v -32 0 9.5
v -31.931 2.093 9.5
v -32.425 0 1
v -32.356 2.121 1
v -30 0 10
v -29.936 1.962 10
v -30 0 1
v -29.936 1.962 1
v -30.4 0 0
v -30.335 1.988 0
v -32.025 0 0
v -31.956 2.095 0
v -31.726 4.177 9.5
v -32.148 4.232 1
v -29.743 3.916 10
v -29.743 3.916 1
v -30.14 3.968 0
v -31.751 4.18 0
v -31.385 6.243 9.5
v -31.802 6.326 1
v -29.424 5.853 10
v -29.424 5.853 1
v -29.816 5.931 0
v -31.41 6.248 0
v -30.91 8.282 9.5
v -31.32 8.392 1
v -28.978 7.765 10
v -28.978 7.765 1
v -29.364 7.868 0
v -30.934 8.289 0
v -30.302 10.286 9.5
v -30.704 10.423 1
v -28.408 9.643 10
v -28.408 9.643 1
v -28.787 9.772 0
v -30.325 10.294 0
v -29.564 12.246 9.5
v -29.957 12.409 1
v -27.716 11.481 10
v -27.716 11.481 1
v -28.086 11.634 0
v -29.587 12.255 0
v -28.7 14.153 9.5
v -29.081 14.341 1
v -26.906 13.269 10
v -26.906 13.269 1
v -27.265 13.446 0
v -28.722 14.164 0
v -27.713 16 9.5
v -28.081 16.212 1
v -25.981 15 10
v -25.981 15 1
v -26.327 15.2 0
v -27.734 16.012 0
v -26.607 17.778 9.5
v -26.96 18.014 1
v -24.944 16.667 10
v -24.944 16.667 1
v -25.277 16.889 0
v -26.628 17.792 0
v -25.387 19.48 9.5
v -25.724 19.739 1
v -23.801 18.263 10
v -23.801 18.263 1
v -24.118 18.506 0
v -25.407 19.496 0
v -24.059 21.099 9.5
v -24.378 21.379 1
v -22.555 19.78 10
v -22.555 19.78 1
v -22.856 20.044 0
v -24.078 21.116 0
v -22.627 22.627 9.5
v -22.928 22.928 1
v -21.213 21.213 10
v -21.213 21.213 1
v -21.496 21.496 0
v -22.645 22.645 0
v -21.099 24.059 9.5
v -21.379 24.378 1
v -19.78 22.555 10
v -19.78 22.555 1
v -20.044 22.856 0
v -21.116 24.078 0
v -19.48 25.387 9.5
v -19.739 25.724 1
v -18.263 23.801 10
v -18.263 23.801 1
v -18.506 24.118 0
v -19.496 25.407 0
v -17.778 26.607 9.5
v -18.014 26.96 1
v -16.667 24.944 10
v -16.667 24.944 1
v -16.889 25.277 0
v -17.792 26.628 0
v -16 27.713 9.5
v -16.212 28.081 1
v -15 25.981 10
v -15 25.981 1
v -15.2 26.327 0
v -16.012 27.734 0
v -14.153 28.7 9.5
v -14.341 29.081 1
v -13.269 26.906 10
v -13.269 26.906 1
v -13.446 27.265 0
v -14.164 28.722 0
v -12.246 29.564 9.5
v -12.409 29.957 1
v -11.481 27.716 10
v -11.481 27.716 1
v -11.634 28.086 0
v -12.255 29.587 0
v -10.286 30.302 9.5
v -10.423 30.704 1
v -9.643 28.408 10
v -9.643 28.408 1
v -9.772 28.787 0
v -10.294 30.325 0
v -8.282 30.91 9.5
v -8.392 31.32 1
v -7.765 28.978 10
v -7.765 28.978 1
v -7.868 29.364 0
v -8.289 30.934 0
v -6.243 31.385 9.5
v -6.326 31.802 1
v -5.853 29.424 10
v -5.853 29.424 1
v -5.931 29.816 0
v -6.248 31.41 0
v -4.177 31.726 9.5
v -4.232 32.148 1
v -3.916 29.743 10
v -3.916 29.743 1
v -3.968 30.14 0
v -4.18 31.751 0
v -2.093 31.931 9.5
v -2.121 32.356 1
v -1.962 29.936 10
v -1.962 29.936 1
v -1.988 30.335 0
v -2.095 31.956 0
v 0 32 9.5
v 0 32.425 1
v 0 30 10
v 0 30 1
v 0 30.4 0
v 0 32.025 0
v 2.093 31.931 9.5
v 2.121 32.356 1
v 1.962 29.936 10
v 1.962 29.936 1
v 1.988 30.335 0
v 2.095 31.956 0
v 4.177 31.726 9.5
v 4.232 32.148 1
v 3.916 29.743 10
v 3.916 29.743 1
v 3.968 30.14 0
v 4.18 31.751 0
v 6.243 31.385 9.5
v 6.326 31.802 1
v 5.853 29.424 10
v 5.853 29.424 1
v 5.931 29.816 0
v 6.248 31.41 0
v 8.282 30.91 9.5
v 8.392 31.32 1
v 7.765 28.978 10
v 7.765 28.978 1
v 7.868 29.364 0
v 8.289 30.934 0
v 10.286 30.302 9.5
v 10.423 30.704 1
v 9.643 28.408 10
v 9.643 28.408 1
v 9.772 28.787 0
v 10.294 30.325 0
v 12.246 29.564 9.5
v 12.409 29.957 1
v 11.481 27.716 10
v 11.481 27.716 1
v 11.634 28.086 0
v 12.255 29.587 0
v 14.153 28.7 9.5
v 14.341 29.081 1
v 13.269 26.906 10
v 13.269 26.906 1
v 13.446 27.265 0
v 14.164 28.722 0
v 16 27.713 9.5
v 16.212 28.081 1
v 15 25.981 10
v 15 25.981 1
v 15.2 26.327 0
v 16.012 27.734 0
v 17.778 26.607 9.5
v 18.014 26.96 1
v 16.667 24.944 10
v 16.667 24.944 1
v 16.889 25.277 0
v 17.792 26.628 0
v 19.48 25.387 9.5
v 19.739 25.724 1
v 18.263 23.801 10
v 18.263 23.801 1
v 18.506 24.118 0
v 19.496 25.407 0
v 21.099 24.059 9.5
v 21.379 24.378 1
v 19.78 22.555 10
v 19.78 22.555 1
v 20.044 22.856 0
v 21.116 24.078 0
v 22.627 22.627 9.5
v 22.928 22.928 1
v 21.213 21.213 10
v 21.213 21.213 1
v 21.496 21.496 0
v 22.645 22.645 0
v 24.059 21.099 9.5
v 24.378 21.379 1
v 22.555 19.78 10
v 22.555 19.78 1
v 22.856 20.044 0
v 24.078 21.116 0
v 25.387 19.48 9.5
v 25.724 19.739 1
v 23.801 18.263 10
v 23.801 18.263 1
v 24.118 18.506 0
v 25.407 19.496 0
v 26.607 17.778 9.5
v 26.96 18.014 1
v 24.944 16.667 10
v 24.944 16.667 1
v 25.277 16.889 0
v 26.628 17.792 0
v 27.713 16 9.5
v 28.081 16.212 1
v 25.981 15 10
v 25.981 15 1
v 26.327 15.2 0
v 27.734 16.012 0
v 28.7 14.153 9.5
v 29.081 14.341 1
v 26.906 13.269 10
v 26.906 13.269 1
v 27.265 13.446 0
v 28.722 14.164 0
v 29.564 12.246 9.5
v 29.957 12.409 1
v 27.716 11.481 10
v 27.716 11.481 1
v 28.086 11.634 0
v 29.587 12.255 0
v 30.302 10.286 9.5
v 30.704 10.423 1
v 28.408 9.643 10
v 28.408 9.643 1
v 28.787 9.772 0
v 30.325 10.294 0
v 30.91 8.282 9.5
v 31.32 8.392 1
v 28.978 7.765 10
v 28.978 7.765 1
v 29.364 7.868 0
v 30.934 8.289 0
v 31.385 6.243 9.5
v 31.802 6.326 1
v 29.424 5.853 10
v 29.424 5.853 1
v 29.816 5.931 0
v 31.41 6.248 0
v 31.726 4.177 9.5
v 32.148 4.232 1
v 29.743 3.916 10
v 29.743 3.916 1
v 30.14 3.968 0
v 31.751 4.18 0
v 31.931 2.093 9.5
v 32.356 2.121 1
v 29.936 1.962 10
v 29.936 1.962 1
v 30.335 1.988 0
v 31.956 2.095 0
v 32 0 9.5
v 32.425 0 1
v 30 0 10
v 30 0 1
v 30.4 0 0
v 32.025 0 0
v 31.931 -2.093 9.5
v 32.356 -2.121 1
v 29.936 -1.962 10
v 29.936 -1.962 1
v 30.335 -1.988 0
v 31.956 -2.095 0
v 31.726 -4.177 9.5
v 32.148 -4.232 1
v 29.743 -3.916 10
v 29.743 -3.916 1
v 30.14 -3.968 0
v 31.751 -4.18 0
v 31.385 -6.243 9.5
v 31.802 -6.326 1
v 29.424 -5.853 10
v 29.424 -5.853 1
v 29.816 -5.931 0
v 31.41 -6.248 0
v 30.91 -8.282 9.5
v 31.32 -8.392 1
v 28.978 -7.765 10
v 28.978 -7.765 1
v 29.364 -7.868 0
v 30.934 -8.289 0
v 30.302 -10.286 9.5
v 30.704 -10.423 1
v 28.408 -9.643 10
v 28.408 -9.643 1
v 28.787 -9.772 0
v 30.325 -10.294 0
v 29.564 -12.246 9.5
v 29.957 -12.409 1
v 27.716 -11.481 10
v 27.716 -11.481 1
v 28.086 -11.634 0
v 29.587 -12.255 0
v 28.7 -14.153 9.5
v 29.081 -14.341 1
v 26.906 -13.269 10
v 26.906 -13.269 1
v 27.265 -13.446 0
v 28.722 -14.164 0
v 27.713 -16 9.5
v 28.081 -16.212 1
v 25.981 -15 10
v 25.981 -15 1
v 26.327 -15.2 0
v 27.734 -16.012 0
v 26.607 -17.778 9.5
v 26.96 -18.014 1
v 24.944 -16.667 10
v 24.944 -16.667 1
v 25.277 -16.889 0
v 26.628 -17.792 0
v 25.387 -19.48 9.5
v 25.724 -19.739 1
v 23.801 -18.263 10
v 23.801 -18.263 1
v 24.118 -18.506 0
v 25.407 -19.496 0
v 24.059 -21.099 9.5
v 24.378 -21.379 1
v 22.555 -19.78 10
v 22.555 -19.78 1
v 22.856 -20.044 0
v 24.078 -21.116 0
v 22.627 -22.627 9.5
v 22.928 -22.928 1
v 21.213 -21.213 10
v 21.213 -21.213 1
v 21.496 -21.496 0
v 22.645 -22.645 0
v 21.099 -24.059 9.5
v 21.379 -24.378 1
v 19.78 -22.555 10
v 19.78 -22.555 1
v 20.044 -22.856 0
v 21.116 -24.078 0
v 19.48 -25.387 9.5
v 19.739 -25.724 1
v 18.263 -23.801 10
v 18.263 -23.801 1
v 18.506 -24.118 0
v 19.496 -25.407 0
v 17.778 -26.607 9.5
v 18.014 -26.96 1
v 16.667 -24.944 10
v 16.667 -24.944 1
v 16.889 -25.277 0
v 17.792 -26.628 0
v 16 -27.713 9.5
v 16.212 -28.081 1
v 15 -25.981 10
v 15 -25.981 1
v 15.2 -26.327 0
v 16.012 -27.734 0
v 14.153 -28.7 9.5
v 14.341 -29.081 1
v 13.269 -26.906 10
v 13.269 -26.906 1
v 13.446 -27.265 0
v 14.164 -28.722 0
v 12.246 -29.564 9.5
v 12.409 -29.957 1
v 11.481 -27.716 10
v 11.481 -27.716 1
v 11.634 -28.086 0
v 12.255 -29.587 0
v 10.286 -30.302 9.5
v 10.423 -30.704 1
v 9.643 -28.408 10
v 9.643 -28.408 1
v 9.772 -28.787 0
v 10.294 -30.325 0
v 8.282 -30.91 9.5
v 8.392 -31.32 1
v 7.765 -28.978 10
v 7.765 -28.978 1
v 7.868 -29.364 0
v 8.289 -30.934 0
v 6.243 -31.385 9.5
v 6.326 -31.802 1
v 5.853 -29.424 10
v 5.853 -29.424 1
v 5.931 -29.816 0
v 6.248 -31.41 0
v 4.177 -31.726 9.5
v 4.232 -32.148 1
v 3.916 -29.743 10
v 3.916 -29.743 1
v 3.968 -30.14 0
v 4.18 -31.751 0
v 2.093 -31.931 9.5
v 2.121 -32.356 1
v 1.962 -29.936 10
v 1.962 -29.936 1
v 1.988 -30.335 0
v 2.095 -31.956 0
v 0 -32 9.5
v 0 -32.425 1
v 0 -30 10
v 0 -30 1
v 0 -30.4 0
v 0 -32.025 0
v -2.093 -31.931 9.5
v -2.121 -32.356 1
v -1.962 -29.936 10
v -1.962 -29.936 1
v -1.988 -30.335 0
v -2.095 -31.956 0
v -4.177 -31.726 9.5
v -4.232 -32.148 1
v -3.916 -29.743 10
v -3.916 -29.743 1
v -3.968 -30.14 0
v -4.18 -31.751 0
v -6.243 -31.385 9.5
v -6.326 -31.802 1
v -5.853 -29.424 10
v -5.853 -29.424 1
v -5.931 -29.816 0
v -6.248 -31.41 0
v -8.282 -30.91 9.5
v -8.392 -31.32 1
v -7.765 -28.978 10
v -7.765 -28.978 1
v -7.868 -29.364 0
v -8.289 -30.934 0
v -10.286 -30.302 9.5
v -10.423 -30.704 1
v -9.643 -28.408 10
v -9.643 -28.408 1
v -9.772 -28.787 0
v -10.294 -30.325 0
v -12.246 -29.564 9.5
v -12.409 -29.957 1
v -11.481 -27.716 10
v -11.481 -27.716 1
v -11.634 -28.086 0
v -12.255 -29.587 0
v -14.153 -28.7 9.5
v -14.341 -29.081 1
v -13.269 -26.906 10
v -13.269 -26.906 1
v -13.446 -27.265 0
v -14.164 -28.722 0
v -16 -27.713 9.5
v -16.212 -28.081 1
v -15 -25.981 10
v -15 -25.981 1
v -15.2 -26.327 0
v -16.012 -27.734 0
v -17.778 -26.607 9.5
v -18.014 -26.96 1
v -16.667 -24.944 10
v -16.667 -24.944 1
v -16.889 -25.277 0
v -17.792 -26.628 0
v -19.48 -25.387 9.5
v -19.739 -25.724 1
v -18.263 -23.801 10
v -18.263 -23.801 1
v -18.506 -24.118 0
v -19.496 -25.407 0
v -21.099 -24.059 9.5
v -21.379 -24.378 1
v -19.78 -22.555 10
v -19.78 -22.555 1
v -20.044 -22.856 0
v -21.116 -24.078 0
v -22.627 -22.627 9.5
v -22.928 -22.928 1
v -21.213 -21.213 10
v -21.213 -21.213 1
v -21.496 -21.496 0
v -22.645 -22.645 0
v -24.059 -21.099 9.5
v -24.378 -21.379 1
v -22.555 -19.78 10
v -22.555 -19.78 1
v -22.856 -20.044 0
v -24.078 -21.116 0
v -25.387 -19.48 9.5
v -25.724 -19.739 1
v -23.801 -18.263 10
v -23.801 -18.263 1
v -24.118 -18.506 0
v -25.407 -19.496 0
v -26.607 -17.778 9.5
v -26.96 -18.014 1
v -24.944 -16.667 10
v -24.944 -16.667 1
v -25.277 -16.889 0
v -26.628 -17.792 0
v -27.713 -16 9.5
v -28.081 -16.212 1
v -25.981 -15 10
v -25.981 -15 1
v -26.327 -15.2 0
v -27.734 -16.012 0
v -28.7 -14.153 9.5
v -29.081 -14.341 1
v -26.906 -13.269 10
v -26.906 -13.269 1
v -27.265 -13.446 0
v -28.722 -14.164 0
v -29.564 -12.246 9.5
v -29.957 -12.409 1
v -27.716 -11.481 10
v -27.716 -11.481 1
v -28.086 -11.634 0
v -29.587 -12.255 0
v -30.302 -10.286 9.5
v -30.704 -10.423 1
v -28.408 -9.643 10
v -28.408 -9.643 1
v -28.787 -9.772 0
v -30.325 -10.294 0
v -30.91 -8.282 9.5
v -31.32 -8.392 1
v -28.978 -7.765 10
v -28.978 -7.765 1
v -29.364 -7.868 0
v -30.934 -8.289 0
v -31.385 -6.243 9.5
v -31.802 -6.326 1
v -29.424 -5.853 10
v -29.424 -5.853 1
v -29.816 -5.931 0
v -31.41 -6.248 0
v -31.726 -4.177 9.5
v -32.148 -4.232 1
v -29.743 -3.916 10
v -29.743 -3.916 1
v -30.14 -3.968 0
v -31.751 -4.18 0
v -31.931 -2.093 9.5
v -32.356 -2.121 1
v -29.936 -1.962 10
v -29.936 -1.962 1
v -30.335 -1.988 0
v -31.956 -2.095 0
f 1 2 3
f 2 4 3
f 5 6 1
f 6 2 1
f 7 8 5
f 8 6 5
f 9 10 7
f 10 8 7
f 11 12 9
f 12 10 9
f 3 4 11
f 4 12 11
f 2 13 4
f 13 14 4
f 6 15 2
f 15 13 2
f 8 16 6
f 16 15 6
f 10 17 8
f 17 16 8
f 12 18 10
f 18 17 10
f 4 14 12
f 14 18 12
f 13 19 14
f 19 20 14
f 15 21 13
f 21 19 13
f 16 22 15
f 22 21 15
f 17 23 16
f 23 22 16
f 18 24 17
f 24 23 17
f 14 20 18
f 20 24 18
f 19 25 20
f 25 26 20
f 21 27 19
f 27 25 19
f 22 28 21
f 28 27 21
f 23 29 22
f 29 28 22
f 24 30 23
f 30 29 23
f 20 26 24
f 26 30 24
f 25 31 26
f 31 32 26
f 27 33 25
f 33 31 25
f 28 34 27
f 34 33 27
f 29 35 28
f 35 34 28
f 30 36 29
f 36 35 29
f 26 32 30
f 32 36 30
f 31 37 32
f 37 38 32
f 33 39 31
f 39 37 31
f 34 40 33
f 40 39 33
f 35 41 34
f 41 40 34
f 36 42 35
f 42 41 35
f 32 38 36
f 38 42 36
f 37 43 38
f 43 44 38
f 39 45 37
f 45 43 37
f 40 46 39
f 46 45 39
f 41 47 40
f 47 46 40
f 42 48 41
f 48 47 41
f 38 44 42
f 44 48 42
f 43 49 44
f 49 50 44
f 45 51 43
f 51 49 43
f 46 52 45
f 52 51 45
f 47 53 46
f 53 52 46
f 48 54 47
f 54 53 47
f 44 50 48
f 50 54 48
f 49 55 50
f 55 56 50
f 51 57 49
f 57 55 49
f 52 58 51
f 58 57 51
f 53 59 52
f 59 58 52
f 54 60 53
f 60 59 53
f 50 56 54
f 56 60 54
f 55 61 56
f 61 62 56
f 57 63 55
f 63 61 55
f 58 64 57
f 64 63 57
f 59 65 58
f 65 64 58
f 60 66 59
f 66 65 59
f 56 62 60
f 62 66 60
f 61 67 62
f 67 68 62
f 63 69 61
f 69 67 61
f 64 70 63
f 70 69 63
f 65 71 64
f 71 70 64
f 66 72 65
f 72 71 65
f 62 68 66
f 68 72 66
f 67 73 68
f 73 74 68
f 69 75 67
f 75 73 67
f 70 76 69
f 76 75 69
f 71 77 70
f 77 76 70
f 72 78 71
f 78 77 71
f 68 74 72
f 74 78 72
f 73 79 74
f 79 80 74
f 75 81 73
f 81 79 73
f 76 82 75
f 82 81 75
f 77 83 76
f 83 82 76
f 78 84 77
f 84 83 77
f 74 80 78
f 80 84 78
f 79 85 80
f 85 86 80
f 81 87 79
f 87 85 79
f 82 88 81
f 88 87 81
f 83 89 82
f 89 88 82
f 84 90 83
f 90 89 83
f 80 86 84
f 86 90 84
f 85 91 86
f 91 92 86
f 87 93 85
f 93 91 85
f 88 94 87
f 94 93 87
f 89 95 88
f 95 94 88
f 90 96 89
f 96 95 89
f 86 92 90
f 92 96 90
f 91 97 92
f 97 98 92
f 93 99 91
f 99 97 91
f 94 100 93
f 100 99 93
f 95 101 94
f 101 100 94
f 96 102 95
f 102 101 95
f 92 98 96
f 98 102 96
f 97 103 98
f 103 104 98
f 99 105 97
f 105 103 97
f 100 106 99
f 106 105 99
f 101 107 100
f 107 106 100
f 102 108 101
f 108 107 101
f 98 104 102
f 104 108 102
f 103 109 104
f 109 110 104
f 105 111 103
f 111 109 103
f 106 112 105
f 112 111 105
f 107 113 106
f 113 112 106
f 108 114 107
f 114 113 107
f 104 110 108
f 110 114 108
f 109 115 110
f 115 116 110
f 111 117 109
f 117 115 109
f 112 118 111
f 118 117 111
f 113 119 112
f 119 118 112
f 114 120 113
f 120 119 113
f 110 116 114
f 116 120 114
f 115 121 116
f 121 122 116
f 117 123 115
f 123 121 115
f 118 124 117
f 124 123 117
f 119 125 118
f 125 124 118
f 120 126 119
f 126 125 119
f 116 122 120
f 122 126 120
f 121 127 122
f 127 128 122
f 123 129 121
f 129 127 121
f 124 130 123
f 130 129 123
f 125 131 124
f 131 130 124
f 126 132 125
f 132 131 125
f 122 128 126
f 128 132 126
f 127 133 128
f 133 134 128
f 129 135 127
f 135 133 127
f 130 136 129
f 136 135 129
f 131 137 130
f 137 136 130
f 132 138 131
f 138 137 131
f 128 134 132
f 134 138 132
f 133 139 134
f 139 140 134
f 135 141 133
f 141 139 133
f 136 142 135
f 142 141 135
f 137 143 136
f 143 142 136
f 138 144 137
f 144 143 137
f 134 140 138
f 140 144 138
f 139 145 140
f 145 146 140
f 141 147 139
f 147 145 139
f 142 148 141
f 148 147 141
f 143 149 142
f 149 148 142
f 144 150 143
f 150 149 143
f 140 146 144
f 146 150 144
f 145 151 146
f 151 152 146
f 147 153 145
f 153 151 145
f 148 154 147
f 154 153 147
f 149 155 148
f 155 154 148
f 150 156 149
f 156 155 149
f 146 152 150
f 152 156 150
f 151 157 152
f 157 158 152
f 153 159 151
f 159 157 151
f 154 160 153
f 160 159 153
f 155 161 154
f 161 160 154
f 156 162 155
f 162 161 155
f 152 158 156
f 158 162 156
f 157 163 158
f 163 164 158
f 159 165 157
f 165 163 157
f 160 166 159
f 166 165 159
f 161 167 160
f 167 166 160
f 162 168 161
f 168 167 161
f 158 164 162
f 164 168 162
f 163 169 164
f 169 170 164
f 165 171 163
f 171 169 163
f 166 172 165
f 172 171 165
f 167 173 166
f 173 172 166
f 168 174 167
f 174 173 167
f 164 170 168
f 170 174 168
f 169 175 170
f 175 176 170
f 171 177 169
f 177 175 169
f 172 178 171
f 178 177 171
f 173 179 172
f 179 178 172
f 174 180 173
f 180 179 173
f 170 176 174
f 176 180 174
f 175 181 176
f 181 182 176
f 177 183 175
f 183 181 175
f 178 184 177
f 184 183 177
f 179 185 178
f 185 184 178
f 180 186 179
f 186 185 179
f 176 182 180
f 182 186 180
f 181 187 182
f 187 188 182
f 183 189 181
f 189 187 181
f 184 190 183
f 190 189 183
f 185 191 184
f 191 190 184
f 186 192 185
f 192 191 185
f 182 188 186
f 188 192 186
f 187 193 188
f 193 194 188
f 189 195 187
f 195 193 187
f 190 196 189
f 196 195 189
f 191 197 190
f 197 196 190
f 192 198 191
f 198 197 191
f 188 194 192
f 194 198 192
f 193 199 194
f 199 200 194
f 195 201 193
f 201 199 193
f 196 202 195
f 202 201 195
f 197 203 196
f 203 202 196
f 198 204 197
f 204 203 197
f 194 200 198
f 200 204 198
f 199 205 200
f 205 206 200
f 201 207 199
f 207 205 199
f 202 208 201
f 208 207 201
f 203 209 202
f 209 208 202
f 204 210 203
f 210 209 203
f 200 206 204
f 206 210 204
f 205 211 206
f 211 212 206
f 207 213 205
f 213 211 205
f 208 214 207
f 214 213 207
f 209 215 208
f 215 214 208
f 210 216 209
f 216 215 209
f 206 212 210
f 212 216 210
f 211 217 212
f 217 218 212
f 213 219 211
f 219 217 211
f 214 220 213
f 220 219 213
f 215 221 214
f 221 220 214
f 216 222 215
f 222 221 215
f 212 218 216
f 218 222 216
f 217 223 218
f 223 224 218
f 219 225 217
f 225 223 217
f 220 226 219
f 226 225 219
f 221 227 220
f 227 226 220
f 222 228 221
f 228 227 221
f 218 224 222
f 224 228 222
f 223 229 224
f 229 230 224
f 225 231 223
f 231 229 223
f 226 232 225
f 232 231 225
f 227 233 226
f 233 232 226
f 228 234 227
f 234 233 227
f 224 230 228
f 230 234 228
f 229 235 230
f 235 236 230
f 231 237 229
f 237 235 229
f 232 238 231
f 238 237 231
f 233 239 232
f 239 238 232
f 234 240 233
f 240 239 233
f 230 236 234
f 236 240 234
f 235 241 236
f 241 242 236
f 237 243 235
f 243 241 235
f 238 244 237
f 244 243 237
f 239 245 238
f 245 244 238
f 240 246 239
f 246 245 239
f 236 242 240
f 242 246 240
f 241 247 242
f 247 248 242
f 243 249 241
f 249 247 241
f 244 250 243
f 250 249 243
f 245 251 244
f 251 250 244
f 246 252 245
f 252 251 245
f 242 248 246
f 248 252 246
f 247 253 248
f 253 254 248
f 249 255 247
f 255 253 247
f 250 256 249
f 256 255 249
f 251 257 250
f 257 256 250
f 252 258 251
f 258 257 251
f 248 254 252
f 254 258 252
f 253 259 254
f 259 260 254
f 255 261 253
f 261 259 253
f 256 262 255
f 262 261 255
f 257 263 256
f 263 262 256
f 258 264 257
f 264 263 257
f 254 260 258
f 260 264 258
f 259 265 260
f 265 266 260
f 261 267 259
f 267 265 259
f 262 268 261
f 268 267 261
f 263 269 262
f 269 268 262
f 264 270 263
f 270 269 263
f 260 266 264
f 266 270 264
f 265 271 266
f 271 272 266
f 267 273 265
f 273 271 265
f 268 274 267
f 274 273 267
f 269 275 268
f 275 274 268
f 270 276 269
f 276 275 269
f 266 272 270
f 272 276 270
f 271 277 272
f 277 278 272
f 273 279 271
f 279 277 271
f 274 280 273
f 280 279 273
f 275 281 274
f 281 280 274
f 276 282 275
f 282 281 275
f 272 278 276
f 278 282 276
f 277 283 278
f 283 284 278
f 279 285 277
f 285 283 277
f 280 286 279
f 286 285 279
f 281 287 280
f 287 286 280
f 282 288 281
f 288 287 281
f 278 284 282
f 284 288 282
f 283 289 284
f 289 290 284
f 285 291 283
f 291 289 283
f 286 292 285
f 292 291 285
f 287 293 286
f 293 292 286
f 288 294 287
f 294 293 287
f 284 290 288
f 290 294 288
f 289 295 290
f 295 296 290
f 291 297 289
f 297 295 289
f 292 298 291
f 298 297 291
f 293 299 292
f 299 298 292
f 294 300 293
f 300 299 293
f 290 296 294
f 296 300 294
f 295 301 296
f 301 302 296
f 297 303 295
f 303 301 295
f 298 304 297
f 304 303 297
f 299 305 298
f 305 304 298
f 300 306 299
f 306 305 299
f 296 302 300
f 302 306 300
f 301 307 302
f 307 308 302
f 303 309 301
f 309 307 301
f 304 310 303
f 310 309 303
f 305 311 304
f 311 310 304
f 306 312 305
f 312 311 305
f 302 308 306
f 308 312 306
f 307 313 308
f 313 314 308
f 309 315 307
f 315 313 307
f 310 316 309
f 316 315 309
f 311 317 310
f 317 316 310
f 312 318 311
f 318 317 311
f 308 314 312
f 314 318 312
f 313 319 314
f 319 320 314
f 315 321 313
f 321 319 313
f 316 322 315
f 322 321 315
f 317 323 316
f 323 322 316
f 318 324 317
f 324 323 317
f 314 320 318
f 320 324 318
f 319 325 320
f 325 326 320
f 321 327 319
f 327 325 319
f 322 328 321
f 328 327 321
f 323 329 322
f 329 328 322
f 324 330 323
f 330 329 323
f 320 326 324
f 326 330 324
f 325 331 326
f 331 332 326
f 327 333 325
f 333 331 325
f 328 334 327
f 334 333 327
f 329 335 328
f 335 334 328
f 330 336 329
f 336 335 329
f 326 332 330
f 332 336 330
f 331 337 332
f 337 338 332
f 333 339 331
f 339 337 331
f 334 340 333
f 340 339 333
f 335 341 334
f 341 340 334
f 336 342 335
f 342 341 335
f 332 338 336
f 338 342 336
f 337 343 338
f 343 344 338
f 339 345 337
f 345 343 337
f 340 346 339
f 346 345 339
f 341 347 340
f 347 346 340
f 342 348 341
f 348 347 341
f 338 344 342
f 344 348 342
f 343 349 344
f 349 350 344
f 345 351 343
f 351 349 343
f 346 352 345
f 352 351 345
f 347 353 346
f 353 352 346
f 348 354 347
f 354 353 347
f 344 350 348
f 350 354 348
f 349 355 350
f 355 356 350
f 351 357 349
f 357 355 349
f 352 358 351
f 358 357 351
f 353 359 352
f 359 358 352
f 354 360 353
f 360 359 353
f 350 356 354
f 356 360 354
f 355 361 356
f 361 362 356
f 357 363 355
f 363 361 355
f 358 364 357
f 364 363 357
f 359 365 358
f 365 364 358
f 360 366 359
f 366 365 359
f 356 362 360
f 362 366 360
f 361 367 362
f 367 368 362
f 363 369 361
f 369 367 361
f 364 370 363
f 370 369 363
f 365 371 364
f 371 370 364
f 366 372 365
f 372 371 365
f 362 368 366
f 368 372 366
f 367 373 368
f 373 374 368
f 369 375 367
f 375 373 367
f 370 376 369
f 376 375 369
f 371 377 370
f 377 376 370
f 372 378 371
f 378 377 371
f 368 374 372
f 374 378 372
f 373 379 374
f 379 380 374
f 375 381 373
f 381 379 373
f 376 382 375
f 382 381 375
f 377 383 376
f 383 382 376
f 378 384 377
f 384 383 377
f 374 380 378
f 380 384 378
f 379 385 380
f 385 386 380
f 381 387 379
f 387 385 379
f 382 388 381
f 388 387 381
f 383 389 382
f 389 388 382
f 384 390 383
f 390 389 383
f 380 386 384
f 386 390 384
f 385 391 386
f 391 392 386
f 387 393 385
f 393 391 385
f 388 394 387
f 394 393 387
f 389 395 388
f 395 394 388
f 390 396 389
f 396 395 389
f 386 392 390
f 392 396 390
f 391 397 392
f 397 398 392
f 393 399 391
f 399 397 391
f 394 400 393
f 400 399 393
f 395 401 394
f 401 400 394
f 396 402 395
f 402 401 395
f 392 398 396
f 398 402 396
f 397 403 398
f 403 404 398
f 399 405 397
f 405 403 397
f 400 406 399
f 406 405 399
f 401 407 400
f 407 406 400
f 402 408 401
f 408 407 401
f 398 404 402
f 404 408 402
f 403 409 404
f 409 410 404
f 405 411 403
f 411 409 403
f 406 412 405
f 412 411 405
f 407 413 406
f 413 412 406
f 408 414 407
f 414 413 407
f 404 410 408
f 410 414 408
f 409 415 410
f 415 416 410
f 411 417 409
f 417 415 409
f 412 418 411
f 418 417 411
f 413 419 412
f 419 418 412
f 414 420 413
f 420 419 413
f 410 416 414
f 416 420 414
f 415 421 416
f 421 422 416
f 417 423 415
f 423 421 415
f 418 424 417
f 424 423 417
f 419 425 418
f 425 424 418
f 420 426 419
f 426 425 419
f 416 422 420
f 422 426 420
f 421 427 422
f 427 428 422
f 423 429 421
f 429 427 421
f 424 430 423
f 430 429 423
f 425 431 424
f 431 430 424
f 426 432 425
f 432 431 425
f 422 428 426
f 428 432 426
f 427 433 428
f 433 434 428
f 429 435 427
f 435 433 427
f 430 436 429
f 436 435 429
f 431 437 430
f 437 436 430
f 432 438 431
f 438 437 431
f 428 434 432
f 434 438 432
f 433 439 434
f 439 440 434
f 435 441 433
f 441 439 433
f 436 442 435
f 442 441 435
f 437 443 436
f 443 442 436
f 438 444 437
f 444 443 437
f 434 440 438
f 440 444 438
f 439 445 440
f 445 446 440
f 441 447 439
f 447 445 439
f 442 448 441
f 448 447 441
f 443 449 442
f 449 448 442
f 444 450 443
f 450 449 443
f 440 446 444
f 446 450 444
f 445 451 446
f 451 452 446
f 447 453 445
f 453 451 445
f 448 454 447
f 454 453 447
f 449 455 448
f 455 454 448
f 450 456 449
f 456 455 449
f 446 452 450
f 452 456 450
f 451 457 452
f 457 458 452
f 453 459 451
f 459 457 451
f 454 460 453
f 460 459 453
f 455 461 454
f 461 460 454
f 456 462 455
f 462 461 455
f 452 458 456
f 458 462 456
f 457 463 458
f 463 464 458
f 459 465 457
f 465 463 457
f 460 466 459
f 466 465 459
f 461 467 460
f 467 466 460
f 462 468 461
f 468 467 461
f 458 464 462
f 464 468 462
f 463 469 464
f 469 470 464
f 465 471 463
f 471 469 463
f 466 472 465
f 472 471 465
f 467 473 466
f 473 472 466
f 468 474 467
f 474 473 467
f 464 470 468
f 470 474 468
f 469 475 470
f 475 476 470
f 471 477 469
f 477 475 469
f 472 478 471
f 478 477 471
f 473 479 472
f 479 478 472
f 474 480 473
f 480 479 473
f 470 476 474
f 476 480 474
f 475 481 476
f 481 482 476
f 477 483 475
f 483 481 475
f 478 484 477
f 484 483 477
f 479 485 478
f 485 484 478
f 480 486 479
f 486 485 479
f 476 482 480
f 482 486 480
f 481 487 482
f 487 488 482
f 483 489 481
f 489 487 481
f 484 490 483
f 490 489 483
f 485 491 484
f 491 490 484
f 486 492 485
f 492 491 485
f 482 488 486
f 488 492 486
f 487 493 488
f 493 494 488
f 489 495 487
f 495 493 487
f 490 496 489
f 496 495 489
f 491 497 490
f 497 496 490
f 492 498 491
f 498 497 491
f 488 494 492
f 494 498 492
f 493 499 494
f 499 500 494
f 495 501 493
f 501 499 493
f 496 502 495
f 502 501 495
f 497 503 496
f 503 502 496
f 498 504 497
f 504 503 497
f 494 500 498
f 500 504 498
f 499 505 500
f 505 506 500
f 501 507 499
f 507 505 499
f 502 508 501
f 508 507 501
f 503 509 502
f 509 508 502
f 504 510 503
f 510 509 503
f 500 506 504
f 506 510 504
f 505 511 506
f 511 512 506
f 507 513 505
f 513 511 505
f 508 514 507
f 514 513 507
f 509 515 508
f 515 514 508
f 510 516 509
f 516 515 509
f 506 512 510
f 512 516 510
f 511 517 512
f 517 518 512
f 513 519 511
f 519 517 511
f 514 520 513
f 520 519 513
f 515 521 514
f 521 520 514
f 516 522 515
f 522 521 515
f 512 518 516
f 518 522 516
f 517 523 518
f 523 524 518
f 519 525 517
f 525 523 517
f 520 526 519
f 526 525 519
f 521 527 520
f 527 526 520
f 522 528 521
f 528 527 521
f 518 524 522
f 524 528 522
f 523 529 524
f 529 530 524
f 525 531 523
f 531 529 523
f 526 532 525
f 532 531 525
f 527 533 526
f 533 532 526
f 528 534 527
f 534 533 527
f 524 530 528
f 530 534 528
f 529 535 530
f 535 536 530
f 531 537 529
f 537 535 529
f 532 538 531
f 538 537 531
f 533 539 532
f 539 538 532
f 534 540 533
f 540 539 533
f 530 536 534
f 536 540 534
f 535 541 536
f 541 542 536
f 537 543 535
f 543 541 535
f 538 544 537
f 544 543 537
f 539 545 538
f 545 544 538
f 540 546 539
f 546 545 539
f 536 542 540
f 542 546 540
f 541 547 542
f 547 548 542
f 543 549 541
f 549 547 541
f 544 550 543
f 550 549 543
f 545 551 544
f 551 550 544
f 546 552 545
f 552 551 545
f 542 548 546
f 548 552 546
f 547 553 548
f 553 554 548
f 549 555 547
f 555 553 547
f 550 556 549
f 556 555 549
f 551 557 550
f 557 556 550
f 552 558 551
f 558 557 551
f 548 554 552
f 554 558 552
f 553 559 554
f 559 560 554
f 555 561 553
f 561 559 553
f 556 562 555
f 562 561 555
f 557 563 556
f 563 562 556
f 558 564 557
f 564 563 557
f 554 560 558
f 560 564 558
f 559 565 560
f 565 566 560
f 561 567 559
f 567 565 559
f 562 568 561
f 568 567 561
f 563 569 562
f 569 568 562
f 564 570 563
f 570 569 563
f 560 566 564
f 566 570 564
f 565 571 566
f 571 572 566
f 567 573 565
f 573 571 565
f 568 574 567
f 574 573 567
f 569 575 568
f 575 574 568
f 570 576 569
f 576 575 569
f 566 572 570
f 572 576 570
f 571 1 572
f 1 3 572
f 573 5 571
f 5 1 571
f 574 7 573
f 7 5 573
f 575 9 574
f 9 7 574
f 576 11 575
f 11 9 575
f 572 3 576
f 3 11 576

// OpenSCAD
// Drum rims to fix a drumhead
// 
// Background:
//   - two conical rings to fix a drumhead
//   - material may be paper, plastic foil, or other sheet material
//   - hosted on:
//     git@github.com:Github6am/am_parts3D.git
//   - CAD manual: http://www.openscad.org/documentation.html
//
// Author: Andreas Merz, 2024-11-17
//   GPLv3 or later, see http://www.gnu.org/licenses 

fn  = 96;       // default face number
ww  = 2.0;      // default wall thickness
cs0 = 1/20;     // default cone slope

// inner part shape
module drum_rim_profile_i(
    w  =  ww,     // wall thickness
    h1 = 10.0,    // height
    cs = cs0,     // cone slope
    ) { 
    dr = (h1-1-0.5)*cs;        // radius difference of outer conical shape
    polygon([
    [ 0.4     , 0],
    [ 0     , 1],
    [ 0     , h1],
    [ w     , h1-0.5],  // make top rim a bit slanted
    [ w+dr  , 1],       // avoid outer diameter error when standing on the printer plate
    [ w+dr-0.4  , 0],
    ]);
}

// outer part shape
module drum_rim_profile_o(
    w  =  ww,     // wall thickness of inner part drum_rim_profile_i()
    c  =  0.2,    // clearance
    wo =  3.0,    // wall thickness
    h2 =  8.0,    // height
    cs = cs0,     // cone slope
    ) { 
    dr = h2*cs;   // radius difference of inner conical shape
    union() {
      difference() {
        polygon([
        [ c+w+dr  , 0],
        [ c+w     , h2],
        [ c+w+0.4 , h2+1],  // avoid inner diameter error when standing on the printer plate
        [ w+wo    , h2+1],
        [ w+wo    , 0],
        ]);
        translate([w+wo+0.2 ,h2/3]) circle(d=2.5);         // optional wire groove 
      }
      translate([w+1-0.1 ,2*h2/3]) rotate(45) square(size=1);   // 0.1mm extra ridge to apply local pressure
    }
}


// ------------- Drum rims ---------------------

// inner rim
module drum_rim_i(
    di = 60.0,    // inner diameter of inner cylinder
    ) { 
    rotate_extrude($fn=fn) translate([di/2 ,0,0]) drum_rim_profile_i();
}

// outer rim
module drum_rim_o(
    di = 60.0,    // inner diameter of inner cylinder
    ) { 
    rotate_extrude($fn=fn) translate([di/2 ,0,0]) drum_rim_profile_o();
}

//------------- Instances --------------------

drum_rim_i();
//drum_rim_o();
//mirror([0,0,1]) drum_rim_o();
